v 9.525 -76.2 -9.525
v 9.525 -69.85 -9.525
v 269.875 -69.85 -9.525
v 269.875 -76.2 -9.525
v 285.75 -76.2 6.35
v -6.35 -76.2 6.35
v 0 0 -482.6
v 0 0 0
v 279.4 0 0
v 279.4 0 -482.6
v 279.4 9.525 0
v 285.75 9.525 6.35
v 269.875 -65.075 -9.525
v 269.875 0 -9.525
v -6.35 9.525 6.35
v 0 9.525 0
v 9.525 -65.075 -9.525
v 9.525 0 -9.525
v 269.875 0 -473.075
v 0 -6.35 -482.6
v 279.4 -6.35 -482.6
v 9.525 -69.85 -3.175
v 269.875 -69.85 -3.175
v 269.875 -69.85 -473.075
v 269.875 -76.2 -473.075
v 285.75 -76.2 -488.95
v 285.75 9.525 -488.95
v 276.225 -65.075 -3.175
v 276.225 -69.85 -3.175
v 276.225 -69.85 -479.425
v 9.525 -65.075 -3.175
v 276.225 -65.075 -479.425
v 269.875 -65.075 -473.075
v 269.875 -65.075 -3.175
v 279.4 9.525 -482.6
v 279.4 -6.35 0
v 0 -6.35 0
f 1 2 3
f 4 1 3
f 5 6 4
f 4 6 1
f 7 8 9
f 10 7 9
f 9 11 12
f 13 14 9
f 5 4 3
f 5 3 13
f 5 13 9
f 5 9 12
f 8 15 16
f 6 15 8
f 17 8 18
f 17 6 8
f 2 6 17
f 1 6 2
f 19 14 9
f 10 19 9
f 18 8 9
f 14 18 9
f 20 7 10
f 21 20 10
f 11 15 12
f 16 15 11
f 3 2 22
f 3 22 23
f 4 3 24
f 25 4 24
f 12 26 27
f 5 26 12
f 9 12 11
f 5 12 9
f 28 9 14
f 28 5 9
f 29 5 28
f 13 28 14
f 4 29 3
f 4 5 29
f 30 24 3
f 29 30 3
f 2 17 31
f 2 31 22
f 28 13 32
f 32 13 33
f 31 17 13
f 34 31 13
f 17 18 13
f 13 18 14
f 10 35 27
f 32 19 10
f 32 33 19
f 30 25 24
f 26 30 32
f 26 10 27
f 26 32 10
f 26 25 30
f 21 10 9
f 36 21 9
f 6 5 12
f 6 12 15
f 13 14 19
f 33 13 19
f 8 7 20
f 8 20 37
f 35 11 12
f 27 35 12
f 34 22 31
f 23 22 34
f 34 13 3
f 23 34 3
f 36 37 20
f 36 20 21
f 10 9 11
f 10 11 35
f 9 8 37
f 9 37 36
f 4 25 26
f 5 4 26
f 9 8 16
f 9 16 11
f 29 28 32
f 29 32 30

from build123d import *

# Parameters (mm, degrees)
F0_W      = 279.4
F0_H      = 482.6
F1_DEPTH  = 6.35
F3_DEPTH  = 76.2
F4_DEPTH  = 9.525
F5_W      = 4.7752
F5_H      = 473.075
F5_H_2    = 9.525
F6_DEPTH  = 6.35
F7_DEPTH  = 76.2
F8_DEPTH  = 9.525
F9_W      = 260.35
F9_H      = 4.7752
F10_DEPTH = 6.35


with BuildPart() as f1:
    # F0 (on Front) → F1 (new body)
    with BuildSketch(Plane.XZ):
        with Locations((139.7, -241.3)):
            Rectangle(F0_W, F0_H)
    extrude(amount=F1_DEPTH)


with BuildPart() as f3:
    # F2 (on Front) → F3 (new body)
    with BuildSketch(Plane.XZ):
        Polygon((279.4, 0), (269.875, -9.525), (269.875, -473.075), (279.4, -482.6), align=None)
        Polygon((285.75, 6.35), (279.4, 0), (279.4, -482.6), (285.75, -488.95), align=None)
    extrude(amount=F3_DEPTH)

    # F2 (on Front) → F4 (join)
    with BuildSketch(Plane.XZ):
        Polygon((285.75, 6.35), (279.4, 0), (279.4, -482.6), (285.75, -488.95), align=None)
    extrude(amount=-F4_DEPTH)

    # F5 (on face) → F6 (cut)
    with BuildSketch(Plane(origin=(269.875, 0, 0), x_dir=(0, -1, 0), z_dir=(-1, 0, 0))):
        with Locations((67.4624, -236.5375)):
            Rectangle(F5_W, F5_H)
        with Locations((67.4624, -477.8375)):
            Rectangle(F5_W, F5_H_2)
    extrude(amount=-F6_DEPTH, mode=Mode.SUBTRACT)


with BuildPart() as f7:
    # F2 (on Front) → F7 (new body)
    with BuildSketch(Plane.XZ):
        Polygon((9.525, -9.525), (269.875, -9.525), (279.4, 0), (0, 0), align=None)
        Polygon((0, 0), (279.4, 0), (285.75, 6.35), (-6.35, 6.35), align=None)
    extrude(amount=F7_DEPTH)

    # F2 (on Front) → F8 (join)
    with BuildSketch(Plane.XZ):
        Polygon((0, 0), (279.4, 0), (285.75, 6.35), (-6.35, 6.35), align=None)
    extrude(amount=-F8_DEPTH)

    # F9 (on face) → F10 (cut)
    with BuildSketch(Plane(origin=(0, 0, -9.525), x_dir=(1, 0, 0), z_dir=(0, 0, -1))):
        with Locations((139.7, 67.4624)):
            Rectangle(F9_W, F9_H)
    extrude(amount=-F10_DEPTH, mode=Mode.SUBTRACT)


solid = Compound([f1.part, f3.part, f7.part])
